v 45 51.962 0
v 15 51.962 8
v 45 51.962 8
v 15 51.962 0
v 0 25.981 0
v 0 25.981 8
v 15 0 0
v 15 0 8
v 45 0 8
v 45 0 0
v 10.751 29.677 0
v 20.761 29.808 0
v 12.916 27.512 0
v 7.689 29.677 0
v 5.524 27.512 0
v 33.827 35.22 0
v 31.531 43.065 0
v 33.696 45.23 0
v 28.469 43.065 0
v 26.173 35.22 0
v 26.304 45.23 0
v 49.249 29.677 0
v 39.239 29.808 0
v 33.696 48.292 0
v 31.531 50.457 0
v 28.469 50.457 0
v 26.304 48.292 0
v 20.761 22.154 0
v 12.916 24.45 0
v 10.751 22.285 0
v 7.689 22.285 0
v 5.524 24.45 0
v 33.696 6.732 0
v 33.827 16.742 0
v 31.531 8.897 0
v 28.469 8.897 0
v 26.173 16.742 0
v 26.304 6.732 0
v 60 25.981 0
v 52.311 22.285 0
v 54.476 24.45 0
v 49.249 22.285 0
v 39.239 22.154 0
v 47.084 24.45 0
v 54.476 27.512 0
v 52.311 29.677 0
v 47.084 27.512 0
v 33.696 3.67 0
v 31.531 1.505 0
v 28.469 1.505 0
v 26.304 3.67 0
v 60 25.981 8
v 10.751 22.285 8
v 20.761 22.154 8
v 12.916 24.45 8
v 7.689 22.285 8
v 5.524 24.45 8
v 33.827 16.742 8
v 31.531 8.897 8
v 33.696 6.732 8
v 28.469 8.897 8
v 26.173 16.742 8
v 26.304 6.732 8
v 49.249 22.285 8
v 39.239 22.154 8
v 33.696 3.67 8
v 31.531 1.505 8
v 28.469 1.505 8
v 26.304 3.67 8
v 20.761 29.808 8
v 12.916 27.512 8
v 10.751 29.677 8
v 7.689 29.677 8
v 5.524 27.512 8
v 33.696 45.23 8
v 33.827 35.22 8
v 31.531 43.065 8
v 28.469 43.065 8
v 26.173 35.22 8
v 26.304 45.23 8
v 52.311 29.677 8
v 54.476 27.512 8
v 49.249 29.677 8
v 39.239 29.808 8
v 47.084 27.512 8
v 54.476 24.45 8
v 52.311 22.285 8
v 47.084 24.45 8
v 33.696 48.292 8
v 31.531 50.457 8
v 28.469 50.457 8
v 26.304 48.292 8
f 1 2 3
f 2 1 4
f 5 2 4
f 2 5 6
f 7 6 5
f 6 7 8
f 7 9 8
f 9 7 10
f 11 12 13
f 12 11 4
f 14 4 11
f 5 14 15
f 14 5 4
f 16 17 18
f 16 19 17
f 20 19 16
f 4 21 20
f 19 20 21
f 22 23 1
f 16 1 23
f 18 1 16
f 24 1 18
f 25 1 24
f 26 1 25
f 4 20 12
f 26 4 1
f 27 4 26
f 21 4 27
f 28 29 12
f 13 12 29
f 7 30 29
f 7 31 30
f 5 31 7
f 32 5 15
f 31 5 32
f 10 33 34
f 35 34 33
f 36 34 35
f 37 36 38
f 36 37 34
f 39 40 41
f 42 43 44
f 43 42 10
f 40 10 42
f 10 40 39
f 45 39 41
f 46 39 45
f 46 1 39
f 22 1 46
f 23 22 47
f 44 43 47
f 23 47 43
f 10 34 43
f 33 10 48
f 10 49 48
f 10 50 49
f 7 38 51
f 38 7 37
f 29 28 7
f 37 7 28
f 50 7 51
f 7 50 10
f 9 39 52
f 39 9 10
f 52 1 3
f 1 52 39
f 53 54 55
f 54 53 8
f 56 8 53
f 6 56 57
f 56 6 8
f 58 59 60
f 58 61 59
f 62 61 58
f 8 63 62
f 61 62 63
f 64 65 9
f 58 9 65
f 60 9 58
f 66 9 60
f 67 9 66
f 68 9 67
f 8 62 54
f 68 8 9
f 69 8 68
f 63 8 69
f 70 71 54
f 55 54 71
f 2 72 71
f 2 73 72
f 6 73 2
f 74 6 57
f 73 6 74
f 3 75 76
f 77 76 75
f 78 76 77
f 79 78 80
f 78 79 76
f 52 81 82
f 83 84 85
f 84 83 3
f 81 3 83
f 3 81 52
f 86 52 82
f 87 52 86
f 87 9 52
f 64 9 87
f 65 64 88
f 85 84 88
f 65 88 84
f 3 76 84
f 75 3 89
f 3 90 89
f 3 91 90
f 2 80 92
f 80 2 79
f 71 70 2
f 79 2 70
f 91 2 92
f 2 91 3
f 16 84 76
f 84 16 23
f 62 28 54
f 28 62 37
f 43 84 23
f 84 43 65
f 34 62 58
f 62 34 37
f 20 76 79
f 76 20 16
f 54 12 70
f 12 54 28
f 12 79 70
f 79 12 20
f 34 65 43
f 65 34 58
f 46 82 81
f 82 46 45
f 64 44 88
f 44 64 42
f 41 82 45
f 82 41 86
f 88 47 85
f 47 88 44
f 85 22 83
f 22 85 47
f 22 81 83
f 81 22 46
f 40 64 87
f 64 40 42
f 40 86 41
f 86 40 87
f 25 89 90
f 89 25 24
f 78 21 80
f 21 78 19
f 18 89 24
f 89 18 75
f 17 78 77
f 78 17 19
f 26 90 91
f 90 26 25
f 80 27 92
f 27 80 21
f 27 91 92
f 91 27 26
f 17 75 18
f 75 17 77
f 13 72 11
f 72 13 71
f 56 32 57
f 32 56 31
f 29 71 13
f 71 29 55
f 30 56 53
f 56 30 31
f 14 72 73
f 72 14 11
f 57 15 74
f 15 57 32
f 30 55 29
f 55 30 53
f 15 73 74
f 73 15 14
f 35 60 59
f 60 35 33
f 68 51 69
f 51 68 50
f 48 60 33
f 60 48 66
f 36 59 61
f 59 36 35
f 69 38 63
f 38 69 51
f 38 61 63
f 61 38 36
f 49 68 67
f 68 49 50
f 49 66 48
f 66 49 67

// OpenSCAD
$fn = 32;

// ----------------------------------------------------------------------
// Polygon plate: 6-gon R30, 4 bolt windows
// ----------------------------------------------------------------------

// --- parameters (mm) ---
sides = 6;                // number of polygon sides
plate_r = 30;             // circumscribed radius of the polygon
bore_r = 10;              // centre bore radius
bolts = 4;                // number of bolt windows
ring_r = 20.78;           // bolt-circle radius
bolt_r = 4;               // bolt window radius
plate_t = 8;              // plate thickness, Z (extrusion height)

plate_d = 2 * plate_r;  // circumscribed diameter
bore_d = 2 * bore_r;  // centre bore diameter
bolt_d = 2 * bolt_r;  // bolt window diameter
ring_d = 2 * ring_r;  // bolt-circle diameter

profile = [[60, 25.981], [45, 51.962], [15, 51.962], [0, 25.981], [15, 0], [45, 0]];  // primary outline, 6 points, counter clockwise
void_1 = [[39.239, 29.808], [33.827, 35.22], [26.173, 35.22], [20.761, 29.808], [20.761, 22.154], [26.173, 16.742], [33.827, 16.742], [39.239, 22.154]];  // centre bore, 8 points
void_2 = [[54.476, 27.512], [52.311, 29.677], [49.249, 29.677], [47.084, 27.512], [47.084, 24.45], [49.249, 22.285], [52.311, 22.285], [54.476, 24.45]];  // bolt window 1, 8 points
void_3 = [[33.696, 48.292], [31.531, 50.457], [28.469, 50.457], [26.304, 48.292], [26.304, 45.23], [28.469, 43.065], [31.531, 43.065], [33.696, 45.23]];  // bolt window 2, 8 points
void_4 = [[12.916, 27.512], [10.751, 29.677], [7.689, 29.677], [5.524, 27.512], [5.524, 24.45], [7.689, 22.285], [10.751, 22.285], [12.916, 24.45]];  // bolt window 3, 8 points
void_5 = [[33.696, 6.732], [31.531, 8.897], [28.469, 8.897], [26.304, 6.732], [26.304, 3.67], [28.469, 1.505], [31.531, 1.505], [33.696, 3.67]];  // bolt window 4, 8 points

// --- the one profile operation ---
difference() {
  linear_extrude(height = plate_t) polygon(points = profile);
  translate([0, 0, -1])
    linear_extrude(height = plate_t + 2) polygon(points = void_1);
  translate([0, 0, -1])
    linear_extrude(height = plate_t + 2) polygon(points = void_2);
  translate([0, 0, -1])
    linear_extrude(height = plate_t + 2) polygon(points = void_3);
  translate([0, 0, -1])
    linear_extrude(height = plate_t + 2) polygon(points = void_4);
  translate([0, 0, -1])
    linear_extrude(height = plate_t + 2) polygon(points = void_5);
}
